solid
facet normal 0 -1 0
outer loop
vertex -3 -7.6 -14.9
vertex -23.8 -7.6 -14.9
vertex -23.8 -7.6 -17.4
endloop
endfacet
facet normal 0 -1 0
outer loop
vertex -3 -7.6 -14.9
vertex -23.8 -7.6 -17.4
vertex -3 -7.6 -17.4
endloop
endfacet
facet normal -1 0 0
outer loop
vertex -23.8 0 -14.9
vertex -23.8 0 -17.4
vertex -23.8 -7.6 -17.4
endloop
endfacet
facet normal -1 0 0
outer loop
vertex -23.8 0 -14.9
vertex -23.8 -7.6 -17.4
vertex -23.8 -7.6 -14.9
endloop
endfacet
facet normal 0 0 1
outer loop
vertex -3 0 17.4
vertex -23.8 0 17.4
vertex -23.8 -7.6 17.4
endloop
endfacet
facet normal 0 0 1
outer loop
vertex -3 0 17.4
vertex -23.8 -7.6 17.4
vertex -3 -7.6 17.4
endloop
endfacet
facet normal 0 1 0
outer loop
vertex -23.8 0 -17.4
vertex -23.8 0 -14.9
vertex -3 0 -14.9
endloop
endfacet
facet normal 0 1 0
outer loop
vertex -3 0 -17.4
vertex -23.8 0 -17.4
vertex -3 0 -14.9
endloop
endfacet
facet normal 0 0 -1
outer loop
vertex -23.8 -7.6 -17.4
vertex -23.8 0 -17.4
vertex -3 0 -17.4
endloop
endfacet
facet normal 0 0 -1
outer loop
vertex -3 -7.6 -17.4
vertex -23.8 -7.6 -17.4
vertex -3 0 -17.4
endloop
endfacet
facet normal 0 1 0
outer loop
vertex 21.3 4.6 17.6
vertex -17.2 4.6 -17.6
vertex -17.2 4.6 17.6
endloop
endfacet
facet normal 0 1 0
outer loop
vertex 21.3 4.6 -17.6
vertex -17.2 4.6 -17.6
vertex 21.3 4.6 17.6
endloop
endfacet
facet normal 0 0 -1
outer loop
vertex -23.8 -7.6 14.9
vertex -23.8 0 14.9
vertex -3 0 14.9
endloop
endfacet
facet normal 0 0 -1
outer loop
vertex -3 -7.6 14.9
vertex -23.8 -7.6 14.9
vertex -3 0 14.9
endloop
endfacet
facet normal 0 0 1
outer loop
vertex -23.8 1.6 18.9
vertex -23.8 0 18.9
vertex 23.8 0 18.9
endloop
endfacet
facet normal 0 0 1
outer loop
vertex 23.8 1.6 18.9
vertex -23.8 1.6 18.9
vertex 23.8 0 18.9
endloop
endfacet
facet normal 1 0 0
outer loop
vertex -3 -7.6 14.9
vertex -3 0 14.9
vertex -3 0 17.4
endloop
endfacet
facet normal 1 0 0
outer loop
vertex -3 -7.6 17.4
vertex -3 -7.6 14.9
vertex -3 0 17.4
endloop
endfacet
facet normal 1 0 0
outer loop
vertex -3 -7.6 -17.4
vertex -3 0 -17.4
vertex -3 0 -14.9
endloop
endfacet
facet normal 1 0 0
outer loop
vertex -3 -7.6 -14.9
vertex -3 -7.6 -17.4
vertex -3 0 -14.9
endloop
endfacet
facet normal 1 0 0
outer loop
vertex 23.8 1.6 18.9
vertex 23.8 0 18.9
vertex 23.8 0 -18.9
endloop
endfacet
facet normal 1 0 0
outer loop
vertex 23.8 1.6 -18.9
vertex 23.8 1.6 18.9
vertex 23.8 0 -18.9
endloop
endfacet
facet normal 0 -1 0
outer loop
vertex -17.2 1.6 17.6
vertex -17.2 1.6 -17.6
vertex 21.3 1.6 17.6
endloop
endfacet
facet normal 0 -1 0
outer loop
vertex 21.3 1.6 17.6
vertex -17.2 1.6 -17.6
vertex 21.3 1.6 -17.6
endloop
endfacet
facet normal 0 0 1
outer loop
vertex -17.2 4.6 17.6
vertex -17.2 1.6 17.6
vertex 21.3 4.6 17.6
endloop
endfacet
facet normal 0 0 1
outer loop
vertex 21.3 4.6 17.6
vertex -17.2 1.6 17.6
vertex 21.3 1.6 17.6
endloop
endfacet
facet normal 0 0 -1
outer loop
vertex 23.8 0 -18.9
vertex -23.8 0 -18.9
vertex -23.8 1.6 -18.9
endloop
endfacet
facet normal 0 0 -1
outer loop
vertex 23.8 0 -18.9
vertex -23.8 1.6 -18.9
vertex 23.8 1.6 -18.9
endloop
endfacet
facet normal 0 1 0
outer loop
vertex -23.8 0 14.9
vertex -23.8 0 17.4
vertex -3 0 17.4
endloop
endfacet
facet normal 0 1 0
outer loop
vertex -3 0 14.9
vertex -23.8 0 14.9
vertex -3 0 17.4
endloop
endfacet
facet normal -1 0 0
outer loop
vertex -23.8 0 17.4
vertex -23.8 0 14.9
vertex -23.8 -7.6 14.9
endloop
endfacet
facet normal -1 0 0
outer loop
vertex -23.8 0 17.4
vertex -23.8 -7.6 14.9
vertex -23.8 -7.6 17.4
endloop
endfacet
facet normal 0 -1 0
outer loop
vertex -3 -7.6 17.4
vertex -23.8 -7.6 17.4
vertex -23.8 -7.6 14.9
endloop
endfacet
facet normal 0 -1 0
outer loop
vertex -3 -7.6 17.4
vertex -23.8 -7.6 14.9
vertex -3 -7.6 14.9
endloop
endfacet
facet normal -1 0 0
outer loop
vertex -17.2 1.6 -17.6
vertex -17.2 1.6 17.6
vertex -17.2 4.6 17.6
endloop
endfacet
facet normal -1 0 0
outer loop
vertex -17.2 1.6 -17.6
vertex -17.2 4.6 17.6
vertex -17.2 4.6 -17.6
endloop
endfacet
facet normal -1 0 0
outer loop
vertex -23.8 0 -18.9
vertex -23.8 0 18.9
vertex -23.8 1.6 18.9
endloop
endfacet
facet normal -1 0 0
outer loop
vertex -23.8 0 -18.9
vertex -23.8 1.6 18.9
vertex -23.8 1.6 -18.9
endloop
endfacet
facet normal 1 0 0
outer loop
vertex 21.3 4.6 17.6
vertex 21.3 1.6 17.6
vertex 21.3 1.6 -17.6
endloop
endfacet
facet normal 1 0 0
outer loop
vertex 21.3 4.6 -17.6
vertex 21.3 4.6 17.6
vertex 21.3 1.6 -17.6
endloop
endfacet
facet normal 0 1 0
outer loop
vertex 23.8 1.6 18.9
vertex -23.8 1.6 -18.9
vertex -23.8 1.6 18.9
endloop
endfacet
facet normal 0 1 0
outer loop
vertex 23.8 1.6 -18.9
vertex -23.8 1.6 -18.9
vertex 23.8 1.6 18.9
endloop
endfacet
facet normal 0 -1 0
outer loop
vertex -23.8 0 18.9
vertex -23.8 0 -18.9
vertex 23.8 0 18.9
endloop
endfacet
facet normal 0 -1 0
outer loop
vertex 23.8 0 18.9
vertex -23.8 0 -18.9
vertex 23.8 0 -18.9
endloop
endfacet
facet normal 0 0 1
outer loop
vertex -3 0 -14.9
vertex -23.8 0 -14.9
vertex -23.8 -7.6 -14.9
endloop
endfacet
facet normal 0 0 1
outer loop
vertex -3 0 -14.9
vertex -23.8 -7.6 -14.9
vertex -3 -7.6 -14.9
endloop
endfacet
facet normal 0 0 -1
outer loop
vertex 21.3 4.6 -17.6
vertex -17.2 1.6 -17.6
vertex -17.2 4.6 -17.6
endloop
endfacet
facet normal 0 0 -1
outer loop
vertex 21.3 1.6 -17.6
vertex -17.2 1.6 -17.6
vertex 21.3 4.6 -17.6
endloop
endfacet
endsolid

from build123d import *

# Parameters (mm, degrees)
SKETCH1_W             = 47.6
SKETCH1_H             = 37.8
BOSS_EXTRUDE1_DEPTH   = 1.6
SKETCH2_W             = 38.5
SKETCH2_H             = 35.2
BOSS_EXTRUDE2_DEPTH   = 3
SKETCH3_W             = 20.8
SKETCH3_H             = 2.5
BOSS_EXTRUDE3_DEPTH   = 7.6
BOSS_EXTRUDE3_2_DEPTH = 7.6


with BuildPart() as part:
    # Sketch1 → Boss-Extrude1 (new body)
    with BuildSketch(Plane(origin=(0, 0, 0), x_dir=(1, 0, 0), z_dir=(0, 1, 0))):
        Rectangle(SKETCH1_W, SKETCH1_H)
    extrude(amount=BOSS_EXTRUDE1_DEPTH)


with BuildPart() as body_2:
    # Sketch2 → Boss-Extrude2 (new body)
    with BuildSketch(Plane(origin=(0, 1.6, 0), x_dir=(1, 0, 0), z_dir=(0, 1, 0))):
        with Locations((2.05, 0)):
            Rectangle(SKETCH2_W, SKETCH2_H)
    extrude(amount=BOSS_EXTRUDE2_DEPTH)


with BuildPart() as body_3:
    # Sketch3 → Boss-Extrude3 (new body)
    with BuildSketch(Plane.XZ):
        with Locations((-13.4, 16.15)):
            Rectangle(SKETCH3_W, SKETCH3_H)
    extrude(amount=BOSS_EXTRUDE3_DEPTH)


with BuildPart() as body_4:
    # Sketch3 → Boss-Extrude3 2 (new body)
    with BuildSketch(Plane.XZ):
        with Locations((-13.4, -16.15)):
            Rectangle(SKETCH3_W, SKETCH3_H)
    extrude(amount=BOSS_EXTRUDE3_2_DEPTH)


solid = Compound([part.part, body_2.part, body_3.part, body_4.part])
